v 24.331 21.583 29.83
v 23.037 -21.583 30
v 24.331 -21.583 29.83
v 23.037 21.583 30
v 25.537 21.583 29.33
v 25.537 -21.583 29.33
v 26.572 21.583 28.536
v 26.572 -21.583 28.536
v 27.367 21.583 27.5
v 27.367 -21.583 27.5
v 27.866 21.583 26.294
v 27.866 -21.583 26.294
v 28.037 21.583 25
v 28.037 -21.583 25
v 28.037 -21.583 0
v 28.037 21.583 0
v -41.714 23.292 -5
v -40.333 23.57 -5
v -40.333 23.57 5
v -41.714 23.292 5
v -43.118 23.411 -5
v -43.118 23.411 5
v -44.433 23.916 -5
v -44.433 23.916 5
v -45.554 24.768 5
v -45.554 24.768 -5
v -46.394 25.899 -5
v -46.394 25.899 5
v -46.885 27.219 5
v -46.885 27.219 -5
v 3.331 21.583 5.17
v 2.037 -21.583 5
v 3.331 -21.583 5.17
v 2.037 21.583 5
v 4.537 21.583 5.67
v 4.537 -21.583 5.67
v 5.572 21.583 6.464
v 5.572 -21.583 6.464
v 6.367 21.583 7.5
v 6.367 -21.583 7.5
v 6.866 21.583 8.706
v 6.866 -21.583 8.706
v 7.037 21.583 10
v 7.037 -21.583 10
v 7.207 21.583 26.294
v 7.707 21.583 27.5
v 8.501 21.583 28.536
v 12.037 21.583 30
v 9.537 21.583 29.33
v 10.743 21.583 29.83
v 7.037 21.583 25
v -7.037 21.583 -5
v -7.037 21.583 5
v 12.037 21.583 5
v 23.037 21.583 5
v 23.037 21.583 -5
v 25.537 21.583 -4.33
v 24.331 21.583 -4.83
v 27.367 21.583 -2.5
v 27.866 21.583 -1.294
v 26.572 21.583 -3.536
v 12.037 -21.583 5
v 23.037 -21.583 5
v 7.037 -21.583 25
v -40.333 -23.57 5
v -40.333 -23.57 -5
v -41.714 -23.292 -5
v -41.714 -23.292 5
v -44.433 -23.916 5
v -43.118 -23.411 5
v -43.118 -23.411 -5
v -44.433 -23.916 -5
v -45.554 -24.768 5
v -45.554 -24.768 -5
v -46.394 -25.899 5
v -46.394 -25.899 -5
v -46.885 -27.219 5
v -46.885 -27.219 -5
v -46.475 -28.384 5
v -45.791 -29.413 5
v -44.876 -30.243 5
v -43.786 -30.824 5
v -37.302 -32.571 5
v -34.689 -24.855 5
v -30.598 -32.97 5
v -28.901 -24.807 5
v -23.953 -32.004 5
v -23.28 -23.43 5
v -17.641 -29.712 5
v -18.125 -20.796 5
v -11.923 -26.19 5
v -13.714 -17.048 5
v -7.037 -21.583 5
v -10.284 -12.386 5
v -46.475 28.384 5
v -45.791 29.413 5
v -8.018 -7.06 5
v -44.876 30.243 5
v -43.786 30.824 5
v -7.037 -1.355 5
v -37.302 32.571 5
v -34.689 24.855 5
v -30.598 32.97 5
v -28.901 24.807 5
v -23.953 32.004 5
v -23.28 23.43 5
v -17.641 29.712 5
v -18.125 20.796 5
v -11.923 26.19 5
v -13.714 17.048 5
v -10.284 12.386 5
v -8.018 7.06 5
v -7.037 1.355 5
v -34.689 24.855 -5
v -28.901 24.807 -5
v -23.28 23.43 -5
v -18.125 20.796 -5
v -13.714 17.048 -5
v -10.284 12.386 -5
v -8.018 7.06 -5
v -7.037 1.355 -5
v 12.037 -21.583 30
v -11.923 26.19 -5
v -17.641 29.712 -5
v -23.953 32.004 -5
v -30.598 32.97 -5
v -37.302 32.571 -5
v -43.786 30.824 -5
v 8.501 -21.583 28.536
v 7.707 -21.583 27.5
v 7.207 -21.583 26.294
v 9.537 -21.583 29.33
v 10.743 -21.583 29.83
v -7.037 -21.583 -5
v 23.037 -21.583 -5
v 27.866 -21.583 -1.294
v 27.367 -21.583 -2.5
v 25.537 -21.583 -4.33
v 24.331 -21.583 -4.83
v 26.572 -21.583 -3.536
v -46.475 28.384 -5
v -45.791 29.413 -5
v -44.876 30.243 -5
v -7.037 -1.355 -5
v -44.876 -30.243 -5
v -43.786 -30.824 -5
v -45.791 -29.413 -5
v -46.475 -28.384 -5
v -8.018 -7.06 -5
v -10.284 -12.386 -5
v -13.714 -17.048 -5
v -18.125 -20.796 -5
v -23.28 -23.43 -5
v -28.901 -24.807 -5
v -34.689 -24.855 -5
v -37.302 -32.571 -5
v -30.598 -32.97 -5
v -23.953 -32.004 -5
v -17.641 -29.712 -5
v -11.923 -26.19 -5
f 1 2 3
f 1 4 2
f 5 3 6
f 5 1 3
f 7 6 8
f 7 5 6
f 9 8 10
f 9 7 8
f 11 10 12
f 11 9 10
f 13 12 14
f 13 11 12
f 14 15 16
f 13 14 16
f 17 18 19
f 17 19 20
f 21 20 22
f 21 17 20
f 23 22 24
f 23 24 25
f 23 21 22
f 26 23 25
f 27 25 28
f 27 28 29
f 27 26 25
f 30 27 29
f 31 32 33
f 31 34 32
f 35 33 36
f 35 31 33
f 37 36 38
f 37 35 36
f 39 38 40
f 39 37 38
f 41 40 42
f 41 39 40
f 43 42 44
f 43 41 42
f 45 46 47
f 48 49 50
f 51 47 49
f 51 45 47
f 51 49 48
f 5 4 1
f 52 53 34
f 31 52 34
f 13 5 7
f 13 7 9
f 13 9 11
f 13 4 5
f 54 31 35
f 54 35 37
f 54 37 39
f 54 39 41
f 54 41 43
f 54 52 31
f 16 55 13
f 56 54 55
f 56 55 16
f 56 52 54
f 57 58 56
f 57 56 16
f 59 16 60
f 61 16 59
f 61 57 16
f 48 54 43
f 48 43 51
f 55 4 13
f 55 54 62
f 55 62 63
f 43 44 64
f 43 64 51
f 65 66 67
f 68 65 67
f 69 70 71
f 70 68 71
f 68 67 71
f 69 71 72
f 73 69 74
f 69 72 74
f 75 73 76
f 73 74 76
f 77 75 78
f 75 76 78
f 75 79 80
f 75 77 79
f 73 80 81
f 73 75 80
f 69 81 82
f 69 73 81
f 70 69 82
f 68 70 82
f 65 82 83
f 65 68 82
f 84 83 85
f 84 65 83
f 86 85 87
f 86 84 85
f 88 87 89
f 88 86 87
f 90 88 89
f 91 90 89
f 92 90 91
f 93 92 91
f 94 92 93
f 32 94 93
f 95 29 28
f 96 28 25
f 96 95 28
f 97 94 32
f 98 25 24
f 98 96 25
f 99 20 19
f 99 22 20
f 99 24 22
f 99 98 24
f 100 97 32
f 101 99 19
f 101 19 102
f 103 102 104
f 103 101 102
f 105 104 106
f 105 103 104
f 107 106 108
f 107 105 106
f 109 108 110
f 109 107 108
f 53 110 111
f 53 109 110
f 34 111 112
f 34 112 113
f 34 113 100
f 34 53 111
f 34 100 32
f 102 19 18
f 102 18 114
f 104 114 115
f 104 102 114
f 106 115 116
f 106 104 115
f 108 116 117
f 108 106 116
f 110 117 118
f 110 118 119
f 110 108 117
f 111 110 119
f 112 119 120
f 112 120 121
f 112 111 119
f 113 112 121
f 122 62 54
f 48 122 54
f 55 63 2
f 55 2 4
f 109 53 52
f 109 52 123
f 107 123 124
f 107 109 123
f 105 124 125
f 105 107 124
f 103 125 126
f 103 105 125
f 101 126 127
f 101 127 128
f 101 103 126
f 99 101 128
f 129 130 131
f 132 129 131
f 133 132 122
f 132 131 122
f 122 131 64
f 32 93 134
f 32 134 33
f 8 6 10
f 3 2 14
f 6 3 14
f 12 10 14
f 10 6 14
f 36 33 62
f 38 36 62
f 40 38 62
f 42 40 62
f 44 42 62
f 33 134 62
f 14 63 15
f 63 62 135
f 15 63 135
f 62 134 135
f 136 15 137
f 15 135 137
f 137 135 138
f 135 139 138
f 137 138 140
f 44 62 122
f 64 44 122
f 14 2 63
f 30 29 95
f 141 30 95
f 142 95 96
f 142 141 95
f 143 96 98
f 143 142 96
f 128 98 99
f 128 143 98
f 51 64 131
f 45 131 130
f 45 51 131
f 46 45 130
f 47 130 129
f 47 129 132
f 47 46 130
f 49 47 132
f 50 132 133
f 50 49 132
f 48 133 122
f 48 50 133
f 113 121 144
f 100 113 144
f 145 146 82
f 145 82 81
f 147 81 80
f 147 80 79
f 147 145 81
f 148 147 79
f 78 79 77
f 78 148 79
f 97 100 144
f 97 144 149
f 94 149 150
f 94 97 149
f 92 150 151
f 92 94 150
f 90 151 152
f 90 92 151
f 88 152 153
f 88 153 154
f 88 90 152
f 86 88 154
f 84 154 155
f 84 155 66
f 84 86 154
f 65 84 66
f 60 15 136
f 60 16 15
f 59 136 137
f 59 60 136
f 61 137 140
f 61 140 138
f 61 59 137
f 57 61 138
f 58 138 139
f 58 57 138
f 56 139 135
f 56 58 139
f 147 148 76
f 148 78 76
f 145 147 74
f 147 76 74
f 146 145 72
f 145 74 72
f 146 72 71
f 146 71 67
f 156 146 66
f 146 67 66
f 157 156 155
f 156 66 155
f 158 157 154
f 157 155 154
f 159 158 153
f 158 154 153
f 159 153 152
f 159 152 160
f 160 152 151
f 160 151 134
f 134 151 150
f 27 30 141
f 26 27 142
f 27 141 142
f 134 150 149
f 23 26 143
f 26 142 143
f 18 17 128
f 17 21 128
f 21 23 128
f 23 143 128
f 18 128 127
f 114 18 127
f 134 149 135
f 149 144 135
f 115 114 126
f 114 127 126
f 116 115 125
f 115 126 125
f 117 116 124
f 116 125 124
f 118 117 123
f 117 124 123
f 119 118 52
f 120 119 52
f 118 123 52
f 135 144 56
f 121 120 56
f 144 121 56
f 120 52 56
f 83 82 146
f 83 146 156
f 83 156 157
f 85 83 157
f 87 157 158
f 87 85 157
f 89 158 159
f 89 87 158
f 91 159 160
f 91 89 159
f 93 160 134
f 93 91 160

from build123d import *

# Parameters (mm, degrees)
F0_W          = 5
F0_H          = 43.1665030722
F0_W_2        = 11
F1_DEPTH      = 5
F1_DEPTH_BACK = 5
F2_T1_DEPTH   = 51.4213562373
F2_T3_DEPTH   = 27.589671948
F3_W          = 5
F3_H          = 43.1665030722
F4_DEPTH      = 25
F5_R          = 4.99999


# Not quite as in the source:
# - a fillet or chamfer that OpenCascade refuses, or shapes differently, is made with other operations: its cross-section is extruded or revolved along the edge and cut away or added
# - a fillet or chamfer is up to 0.001 mm smaller than in the source, because OpenCascade refuses the exact size
# - a feature names something its author has since deleted; it is built from what else it names


with BuildPart() as f1:
    # F0 (on Top) → F1 (new body, two sides)
    with BuildSketch(Plane.XY) as f1_sk:
        with BuildLine():
            ThreePointArc((-7.0367619663, -1.3552663468), (-21.4300874517, -22.6556162733), (-47, -20))
            Line((-47, -20), (-47, -29.3938769134))
            ThreePointArc((-47, -29.3938769134), (-25.6700714676, -32.3872197753), (-7.0367619663, -21.5832515361))
            Line((-7.0367619663, -21.5832515361), (-7.0367619663, -1.3552663468))
        make_face()
        with BuildLine():
            Line((-7.0367619663, 1.3552663468), (-7.0367619663, -1.3552663468))
            ThreePointArc((-7.0367619663, -1.3552663468), (-7, 0), (-7.0367619663, 1.3552663468))
        make_face()
        with BuildLine():
            ThreePointArc((-7.0367619663, 1.3552663468), (-7, 0), (-7.0367619663, -1.3552663468))
            Line((-7.0367619663, -1.3552663468), (-7.0367619663, -21.5832515361))
            ThreePointArc((-7.0367619663, -21.5832515361), (1, 0), (-7.0367619663, 21.5832515361))
            Line((-7.0367619663, 21.5832515361), (-7.0367619663, 1.3552663468))
        make_face()
        with BuildLine():
            ThreePointArc((-47, 20), (-21.4300874517, 22.6556162733), (-7.0367619663, 1.3552663468))
            Line((-7.0367619663, 1.3552663468), (-7.0367619663, 21.5832515361))
            ThreePointArc((-7.0367619663, 21.5832515361), (-25.6700714676, 32.3872197753), (-47, 29.3938769134))
            Line((-47, 29.3938769134), (-47, 20))
        make_face()
        with BuildLine():
            ThreePointArc((-7.0367619663, 21.5832515361), (1, 0), (-7.0367619663, -21.5832515361))
            Line((-7.0367619663, -21.5832515361), (7.0367619663, -21.5832515361))
            Line((7.0367619663, -21.5832515361), (7.0367619663, 21.5832515361))
            Line((7.0367619663, 21.5832515361), (-7.0367619663, 21.5832515361))
        make_face()
        with Locations((9.5367619663, 0)):
            Rectangle(F0_W, F0_H)
        with Locations((17.5367619663, 0)):
            Rectangle(F0_W_2, F0_H)
        with Locations((25.5367619663, 0)):
            Rectangle(F0_W, F0_H)
    extrude(amount=F1_DEPTH)
    extrude(f1_sk.sketch, amount=-F1_DEPTH_BACK)

    # F2: fillet of radius 5 on 4 edges, made by hand

    # F2_s2 → F2_t1 (cut)
    with BuildSketch(Plane.XY.offset(-25.7106781187)):
        with BuildLine():
            ThreePointArc((-40.3333333333, 23.5702260396), (-44.8867513459, 24.2017883428), (-47, 28.2842712475))
            Line((-47, 28.2842712475), (-47, 20))
            ThreePointArc((-47, 20), (-43.8024463398, 22.0386537791), (-40.3333333333, 23.5702260396))
        make_face()
        with BuildLine():
            ThreePointArc((-40.3333333333, -23.5702260396), (-44.8867513459, -24.2017883428), (-47, -28.2842712475))
            Line((-47, -28.2842712475), (-47, -20))
            ThreePointArc((-47, -20), (-43.8024463398, -22.0386537791), (-40.3333333333, -23.5702260396))
        make_face()
    extrude(amount=F2_T1_DEPTH, mode=Mode.SUBTRACT)

    # F2_s4 → F2_t3 (cut)
    with BuildSketch(Plane.XY.offset(-13.794835974)):
        with BuildLine():
            ThreePointArc((-43.7857142857, -30.8236425293), (-46.1187723552, -28.9881272088), (-47, -26.1533936612))
            Line((-47, -26.1533936612), (-47, -29.3938769134))
            ThreePointArc((-47, -29.3938769134), (-45.4119230492, -30.1516221806), (-43.7857142857, -30.8236425293))
        make_face()
        with BuildLine():
            ThreePointArc((-47, 26.1533936612), (-46.1187723552, 28.9881272088), (-43.7857142857, 30.8236425293))
            ThreePointArc((-43.7857142857, 30.8236425293), (-45.4119230492, 30.1516221806), (-47, 29.3938769134))
            Line((-47, 29.3938769134), (-47, 26.1533936612))
        make_face()
    extrude(amount=F2_T3_DEPTH, mode=Mode.SUBTRACT)

    # F3 (on face) → F4 (join)
    with BuildSketch(Plane.XY.offset(5)):
        with Locations((9.5367619663, 0)):
            Rectangle(F3_W, F3_H)
        with Locations((25.5367619663, 0)):
            Rectangle(F3_W, F3_H)
    extrude(amount=F4_DEPTH)

    # F5 (radius 5 in the source; OpenCascade refuses exactly that, so slightly less here)
    f5_edges = [f1.edges().sort_by_distance(p)[0] for p in [
        (7.036762, 0, 5),
        (7.036762, 0, 30),
        (28.036762, 0, 30),
        (28.036762, 0, -5),
    ]]
    fillet(f5_edges, radius=F5_R)


solid = f1.part
